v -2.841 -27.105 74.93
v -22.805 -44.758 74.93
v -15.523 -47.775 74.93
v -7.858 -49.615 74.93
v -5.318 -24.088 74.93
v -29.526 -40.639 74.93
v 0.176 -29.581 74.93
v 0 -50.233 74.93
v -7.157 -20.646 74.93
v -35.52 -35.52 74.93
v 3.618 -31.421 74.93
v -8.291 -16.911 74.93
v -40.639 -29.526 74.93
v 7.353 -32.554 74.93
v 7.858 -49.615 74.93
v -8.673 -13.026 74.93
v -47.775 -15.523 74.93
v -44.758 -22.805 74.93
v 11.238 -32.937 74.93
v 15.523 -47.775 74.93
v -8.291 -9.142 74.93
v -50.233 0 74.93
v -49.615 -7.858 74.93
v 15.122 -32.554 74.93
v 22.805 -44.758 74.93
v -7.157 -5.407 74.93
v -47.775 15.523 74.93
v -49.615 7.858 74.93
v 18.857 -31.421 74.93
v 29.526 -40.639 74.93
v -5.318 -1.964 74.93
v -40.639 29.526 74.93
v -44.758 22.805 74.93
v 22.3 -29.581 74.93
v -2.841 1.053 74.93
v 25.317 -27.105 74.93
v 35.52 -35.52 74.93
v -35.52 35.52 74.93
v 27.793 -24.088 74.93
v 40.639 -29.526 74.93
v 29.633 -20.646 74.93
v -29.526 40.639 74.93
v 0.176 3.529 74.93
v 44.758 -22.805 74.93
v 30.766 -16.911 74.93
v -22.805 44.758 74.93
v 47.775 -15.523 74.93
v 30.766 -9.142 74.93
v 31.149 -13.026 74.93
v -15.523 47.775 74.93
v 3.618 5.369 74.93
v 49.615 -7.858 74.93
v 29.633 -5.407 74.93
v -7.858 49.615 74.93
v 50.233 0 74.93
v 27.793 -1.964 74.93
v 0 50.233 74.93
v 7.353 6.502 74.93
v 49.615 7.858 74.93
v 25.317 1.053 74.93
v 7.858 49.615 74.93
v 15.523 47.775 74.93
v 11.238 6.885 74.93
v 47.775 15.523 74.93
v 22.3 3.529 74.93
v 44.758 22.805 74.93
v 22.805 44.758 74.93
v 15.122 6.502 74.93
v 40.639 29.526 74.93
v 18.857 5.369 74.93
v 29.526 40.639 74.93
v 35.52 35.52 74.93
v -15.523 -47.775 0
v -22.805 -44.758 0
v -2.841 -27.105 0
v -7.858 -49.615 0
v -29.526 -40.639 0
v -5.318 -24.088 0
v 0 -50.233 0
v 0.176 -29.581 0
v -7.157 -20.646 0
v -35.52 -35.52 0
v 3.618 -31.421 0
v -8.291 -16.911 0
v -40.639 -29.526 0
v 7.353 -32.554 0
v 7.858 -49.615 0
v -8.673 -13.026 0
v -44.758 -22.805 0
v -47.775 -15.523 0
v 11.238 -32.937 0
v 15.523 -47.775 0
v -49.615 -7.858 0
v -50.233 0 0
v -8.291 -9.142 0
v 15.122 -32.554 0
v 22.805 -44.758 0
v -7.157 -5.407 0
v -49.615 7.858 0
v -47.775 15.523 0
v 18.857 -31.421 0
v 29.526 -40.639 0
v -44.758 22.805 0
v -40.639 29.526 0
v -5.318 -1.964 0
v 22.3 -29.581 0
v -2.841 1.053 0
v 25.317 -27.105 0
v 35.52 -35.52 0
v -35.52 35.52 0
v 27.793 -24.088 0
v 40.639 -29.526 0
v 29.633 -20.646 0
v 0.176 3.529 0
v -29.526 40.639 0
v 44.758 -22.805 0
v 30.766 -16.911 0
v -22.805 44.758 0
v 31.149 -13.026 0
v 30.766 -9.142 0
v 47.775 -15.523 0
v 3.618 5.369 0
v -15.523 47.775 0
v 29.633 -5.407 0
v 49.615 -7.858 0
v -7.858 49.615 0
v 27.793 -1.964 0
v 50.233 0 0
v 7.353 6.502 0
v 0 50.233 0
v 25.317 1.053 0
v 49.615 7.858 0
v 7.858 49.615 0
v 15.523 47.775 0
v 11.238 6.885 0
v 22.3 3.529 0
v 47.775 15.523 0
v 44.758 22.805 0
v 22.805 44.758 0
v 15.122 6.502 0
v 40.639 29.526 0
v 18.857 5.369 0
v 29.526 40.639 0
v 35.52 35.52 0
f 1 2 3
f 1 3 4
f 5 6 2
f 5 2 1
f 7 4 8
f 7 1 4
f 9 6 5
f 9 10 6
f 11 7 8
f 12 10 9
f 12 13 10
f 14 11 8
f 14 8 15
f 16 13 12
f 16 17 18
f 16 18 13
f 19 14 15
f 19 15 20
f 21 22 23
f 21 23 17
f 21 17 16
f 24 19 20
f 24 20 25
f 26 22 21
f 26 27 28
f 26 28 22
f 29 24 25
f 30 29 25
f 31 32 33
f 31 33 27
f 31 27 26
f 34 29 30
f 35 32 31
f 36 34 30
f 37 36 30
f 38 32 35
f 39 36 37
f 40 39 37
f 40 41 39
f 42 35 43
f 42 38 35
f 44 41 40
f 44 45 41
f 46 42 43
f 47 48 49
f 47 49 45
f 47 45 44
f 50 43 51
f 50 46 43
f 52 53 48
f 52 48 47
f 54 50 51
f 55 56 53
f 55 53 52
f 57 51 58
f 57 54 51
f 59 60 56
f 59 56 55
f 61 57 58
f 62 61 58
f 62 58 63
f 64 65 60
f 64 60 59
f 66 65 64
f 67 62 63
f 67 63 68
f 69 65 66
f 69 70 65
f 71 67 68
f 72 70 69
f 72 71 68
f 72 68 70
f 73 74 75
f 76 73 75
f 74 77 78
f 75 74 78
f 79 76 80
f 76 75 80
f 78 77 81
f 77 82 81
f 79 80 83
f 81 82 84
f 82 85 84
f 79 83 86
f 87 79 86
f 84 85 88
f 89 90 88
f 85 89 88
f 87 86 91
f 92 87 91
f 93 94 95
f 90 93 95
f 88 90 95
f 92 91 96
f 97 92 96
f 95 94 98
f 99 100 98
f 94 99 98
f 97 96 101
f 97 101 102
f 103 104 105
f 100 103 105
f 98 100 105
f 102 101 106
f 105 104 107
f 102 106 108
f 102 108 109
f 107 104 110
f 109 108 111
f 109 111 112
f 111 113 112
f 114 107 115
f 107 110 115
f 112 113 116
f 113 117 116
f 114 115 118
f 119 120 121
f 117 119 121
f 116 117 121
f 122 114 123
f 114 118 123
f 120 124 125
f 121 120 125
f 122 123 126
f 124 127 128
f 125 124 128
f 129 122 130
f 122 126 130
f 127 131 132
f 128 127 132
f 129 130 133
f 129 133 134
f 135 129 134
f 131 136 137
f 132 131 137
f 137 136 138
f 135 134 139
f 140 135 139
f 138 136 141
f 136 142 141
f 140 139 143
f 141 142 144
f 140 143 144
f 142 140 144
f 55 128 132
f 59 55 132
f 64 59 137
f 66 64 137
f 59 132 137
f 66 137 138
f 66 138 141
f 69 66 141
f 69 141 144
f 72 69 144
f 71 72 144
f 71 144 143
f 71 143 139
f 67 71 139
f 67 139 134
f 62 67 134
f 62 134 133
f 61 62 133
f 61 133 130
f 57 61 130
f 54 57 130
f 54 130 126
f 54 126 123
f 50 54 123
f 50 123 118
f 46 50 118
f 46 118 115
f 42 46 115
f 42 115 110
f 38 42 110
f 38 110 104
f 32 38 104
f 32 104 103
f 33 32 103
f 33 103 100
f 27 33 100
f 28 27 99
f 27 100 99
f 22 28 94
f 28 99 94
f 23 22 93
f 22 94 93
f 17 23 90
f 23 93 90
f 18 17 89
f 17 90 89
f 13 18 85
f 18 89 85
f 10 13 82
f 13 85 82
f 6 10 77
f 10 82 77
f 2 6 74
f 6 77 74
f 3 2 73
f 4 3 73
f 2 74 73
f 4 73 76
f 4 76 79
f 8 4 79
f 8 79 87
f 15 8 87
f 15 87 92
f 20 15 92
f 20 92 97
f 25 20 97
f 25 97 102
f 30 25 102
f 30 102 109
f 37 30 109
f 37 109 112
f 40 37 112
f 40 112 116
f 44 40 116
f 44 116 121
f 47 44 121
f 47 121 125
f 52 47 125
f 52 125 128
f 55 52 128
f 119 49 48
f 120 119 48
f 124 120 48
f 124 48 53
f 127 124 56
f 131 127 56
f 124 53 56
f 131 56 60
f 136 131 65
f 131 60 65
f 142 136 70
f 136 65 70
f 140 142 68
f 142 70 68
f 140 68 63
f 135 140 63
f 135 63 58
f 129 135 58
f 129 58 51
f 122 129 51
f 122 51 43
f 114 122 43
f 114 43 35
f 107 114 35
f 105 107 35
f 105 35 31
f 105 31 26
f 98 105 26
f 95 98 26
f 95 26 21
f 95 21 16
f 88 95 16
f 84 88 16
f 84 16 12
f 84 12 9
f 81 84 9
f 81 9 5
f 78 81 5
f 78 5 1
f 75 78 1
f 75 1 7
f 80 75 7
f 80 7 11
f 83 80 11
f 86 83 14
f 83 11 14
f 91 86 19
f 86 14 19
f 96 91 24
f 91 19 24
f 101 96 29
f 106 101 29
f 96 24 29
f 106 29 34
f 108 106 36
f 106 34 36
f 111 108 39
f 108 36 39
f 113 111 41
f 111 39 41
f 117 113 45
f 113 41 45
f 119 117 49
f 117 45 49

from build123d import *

# Parameters (mm, degrees)
F0_R      = 50.233177
F1_DEPTH  = 100.33
F1_FACE_R = 50.233177
F2_DEPTH  = 25.4
F3_R      = 19.910889
F4_DEPTH  = 258.826


with BuildPart() as f1:
    # F0 (on Top) → F1 (new body)
    with BuildSketch(Plane.XY):
        Circle(F0_R)
    extrude(amount=F1_DEPTH)

    # F1_face (on face) → F2 (cut)
    with BuildSketch(Plane.XY.offset(100.33)):
        Circle(F1_FACE_R)
    extrude(amount=-F2_DEPTH, mode=Mode.SUBTRACT)

    # F3 (on face) → F4 (cut)
    with BuildSketch(Plane.XY.offset(74.93)):
        with Locations((11.237776, -13.026105)):
            Circle(F3_R)
    extrude(amount=-F4_DEPTH, mode=Mode.SUBTRACT)


solid = f1.part
